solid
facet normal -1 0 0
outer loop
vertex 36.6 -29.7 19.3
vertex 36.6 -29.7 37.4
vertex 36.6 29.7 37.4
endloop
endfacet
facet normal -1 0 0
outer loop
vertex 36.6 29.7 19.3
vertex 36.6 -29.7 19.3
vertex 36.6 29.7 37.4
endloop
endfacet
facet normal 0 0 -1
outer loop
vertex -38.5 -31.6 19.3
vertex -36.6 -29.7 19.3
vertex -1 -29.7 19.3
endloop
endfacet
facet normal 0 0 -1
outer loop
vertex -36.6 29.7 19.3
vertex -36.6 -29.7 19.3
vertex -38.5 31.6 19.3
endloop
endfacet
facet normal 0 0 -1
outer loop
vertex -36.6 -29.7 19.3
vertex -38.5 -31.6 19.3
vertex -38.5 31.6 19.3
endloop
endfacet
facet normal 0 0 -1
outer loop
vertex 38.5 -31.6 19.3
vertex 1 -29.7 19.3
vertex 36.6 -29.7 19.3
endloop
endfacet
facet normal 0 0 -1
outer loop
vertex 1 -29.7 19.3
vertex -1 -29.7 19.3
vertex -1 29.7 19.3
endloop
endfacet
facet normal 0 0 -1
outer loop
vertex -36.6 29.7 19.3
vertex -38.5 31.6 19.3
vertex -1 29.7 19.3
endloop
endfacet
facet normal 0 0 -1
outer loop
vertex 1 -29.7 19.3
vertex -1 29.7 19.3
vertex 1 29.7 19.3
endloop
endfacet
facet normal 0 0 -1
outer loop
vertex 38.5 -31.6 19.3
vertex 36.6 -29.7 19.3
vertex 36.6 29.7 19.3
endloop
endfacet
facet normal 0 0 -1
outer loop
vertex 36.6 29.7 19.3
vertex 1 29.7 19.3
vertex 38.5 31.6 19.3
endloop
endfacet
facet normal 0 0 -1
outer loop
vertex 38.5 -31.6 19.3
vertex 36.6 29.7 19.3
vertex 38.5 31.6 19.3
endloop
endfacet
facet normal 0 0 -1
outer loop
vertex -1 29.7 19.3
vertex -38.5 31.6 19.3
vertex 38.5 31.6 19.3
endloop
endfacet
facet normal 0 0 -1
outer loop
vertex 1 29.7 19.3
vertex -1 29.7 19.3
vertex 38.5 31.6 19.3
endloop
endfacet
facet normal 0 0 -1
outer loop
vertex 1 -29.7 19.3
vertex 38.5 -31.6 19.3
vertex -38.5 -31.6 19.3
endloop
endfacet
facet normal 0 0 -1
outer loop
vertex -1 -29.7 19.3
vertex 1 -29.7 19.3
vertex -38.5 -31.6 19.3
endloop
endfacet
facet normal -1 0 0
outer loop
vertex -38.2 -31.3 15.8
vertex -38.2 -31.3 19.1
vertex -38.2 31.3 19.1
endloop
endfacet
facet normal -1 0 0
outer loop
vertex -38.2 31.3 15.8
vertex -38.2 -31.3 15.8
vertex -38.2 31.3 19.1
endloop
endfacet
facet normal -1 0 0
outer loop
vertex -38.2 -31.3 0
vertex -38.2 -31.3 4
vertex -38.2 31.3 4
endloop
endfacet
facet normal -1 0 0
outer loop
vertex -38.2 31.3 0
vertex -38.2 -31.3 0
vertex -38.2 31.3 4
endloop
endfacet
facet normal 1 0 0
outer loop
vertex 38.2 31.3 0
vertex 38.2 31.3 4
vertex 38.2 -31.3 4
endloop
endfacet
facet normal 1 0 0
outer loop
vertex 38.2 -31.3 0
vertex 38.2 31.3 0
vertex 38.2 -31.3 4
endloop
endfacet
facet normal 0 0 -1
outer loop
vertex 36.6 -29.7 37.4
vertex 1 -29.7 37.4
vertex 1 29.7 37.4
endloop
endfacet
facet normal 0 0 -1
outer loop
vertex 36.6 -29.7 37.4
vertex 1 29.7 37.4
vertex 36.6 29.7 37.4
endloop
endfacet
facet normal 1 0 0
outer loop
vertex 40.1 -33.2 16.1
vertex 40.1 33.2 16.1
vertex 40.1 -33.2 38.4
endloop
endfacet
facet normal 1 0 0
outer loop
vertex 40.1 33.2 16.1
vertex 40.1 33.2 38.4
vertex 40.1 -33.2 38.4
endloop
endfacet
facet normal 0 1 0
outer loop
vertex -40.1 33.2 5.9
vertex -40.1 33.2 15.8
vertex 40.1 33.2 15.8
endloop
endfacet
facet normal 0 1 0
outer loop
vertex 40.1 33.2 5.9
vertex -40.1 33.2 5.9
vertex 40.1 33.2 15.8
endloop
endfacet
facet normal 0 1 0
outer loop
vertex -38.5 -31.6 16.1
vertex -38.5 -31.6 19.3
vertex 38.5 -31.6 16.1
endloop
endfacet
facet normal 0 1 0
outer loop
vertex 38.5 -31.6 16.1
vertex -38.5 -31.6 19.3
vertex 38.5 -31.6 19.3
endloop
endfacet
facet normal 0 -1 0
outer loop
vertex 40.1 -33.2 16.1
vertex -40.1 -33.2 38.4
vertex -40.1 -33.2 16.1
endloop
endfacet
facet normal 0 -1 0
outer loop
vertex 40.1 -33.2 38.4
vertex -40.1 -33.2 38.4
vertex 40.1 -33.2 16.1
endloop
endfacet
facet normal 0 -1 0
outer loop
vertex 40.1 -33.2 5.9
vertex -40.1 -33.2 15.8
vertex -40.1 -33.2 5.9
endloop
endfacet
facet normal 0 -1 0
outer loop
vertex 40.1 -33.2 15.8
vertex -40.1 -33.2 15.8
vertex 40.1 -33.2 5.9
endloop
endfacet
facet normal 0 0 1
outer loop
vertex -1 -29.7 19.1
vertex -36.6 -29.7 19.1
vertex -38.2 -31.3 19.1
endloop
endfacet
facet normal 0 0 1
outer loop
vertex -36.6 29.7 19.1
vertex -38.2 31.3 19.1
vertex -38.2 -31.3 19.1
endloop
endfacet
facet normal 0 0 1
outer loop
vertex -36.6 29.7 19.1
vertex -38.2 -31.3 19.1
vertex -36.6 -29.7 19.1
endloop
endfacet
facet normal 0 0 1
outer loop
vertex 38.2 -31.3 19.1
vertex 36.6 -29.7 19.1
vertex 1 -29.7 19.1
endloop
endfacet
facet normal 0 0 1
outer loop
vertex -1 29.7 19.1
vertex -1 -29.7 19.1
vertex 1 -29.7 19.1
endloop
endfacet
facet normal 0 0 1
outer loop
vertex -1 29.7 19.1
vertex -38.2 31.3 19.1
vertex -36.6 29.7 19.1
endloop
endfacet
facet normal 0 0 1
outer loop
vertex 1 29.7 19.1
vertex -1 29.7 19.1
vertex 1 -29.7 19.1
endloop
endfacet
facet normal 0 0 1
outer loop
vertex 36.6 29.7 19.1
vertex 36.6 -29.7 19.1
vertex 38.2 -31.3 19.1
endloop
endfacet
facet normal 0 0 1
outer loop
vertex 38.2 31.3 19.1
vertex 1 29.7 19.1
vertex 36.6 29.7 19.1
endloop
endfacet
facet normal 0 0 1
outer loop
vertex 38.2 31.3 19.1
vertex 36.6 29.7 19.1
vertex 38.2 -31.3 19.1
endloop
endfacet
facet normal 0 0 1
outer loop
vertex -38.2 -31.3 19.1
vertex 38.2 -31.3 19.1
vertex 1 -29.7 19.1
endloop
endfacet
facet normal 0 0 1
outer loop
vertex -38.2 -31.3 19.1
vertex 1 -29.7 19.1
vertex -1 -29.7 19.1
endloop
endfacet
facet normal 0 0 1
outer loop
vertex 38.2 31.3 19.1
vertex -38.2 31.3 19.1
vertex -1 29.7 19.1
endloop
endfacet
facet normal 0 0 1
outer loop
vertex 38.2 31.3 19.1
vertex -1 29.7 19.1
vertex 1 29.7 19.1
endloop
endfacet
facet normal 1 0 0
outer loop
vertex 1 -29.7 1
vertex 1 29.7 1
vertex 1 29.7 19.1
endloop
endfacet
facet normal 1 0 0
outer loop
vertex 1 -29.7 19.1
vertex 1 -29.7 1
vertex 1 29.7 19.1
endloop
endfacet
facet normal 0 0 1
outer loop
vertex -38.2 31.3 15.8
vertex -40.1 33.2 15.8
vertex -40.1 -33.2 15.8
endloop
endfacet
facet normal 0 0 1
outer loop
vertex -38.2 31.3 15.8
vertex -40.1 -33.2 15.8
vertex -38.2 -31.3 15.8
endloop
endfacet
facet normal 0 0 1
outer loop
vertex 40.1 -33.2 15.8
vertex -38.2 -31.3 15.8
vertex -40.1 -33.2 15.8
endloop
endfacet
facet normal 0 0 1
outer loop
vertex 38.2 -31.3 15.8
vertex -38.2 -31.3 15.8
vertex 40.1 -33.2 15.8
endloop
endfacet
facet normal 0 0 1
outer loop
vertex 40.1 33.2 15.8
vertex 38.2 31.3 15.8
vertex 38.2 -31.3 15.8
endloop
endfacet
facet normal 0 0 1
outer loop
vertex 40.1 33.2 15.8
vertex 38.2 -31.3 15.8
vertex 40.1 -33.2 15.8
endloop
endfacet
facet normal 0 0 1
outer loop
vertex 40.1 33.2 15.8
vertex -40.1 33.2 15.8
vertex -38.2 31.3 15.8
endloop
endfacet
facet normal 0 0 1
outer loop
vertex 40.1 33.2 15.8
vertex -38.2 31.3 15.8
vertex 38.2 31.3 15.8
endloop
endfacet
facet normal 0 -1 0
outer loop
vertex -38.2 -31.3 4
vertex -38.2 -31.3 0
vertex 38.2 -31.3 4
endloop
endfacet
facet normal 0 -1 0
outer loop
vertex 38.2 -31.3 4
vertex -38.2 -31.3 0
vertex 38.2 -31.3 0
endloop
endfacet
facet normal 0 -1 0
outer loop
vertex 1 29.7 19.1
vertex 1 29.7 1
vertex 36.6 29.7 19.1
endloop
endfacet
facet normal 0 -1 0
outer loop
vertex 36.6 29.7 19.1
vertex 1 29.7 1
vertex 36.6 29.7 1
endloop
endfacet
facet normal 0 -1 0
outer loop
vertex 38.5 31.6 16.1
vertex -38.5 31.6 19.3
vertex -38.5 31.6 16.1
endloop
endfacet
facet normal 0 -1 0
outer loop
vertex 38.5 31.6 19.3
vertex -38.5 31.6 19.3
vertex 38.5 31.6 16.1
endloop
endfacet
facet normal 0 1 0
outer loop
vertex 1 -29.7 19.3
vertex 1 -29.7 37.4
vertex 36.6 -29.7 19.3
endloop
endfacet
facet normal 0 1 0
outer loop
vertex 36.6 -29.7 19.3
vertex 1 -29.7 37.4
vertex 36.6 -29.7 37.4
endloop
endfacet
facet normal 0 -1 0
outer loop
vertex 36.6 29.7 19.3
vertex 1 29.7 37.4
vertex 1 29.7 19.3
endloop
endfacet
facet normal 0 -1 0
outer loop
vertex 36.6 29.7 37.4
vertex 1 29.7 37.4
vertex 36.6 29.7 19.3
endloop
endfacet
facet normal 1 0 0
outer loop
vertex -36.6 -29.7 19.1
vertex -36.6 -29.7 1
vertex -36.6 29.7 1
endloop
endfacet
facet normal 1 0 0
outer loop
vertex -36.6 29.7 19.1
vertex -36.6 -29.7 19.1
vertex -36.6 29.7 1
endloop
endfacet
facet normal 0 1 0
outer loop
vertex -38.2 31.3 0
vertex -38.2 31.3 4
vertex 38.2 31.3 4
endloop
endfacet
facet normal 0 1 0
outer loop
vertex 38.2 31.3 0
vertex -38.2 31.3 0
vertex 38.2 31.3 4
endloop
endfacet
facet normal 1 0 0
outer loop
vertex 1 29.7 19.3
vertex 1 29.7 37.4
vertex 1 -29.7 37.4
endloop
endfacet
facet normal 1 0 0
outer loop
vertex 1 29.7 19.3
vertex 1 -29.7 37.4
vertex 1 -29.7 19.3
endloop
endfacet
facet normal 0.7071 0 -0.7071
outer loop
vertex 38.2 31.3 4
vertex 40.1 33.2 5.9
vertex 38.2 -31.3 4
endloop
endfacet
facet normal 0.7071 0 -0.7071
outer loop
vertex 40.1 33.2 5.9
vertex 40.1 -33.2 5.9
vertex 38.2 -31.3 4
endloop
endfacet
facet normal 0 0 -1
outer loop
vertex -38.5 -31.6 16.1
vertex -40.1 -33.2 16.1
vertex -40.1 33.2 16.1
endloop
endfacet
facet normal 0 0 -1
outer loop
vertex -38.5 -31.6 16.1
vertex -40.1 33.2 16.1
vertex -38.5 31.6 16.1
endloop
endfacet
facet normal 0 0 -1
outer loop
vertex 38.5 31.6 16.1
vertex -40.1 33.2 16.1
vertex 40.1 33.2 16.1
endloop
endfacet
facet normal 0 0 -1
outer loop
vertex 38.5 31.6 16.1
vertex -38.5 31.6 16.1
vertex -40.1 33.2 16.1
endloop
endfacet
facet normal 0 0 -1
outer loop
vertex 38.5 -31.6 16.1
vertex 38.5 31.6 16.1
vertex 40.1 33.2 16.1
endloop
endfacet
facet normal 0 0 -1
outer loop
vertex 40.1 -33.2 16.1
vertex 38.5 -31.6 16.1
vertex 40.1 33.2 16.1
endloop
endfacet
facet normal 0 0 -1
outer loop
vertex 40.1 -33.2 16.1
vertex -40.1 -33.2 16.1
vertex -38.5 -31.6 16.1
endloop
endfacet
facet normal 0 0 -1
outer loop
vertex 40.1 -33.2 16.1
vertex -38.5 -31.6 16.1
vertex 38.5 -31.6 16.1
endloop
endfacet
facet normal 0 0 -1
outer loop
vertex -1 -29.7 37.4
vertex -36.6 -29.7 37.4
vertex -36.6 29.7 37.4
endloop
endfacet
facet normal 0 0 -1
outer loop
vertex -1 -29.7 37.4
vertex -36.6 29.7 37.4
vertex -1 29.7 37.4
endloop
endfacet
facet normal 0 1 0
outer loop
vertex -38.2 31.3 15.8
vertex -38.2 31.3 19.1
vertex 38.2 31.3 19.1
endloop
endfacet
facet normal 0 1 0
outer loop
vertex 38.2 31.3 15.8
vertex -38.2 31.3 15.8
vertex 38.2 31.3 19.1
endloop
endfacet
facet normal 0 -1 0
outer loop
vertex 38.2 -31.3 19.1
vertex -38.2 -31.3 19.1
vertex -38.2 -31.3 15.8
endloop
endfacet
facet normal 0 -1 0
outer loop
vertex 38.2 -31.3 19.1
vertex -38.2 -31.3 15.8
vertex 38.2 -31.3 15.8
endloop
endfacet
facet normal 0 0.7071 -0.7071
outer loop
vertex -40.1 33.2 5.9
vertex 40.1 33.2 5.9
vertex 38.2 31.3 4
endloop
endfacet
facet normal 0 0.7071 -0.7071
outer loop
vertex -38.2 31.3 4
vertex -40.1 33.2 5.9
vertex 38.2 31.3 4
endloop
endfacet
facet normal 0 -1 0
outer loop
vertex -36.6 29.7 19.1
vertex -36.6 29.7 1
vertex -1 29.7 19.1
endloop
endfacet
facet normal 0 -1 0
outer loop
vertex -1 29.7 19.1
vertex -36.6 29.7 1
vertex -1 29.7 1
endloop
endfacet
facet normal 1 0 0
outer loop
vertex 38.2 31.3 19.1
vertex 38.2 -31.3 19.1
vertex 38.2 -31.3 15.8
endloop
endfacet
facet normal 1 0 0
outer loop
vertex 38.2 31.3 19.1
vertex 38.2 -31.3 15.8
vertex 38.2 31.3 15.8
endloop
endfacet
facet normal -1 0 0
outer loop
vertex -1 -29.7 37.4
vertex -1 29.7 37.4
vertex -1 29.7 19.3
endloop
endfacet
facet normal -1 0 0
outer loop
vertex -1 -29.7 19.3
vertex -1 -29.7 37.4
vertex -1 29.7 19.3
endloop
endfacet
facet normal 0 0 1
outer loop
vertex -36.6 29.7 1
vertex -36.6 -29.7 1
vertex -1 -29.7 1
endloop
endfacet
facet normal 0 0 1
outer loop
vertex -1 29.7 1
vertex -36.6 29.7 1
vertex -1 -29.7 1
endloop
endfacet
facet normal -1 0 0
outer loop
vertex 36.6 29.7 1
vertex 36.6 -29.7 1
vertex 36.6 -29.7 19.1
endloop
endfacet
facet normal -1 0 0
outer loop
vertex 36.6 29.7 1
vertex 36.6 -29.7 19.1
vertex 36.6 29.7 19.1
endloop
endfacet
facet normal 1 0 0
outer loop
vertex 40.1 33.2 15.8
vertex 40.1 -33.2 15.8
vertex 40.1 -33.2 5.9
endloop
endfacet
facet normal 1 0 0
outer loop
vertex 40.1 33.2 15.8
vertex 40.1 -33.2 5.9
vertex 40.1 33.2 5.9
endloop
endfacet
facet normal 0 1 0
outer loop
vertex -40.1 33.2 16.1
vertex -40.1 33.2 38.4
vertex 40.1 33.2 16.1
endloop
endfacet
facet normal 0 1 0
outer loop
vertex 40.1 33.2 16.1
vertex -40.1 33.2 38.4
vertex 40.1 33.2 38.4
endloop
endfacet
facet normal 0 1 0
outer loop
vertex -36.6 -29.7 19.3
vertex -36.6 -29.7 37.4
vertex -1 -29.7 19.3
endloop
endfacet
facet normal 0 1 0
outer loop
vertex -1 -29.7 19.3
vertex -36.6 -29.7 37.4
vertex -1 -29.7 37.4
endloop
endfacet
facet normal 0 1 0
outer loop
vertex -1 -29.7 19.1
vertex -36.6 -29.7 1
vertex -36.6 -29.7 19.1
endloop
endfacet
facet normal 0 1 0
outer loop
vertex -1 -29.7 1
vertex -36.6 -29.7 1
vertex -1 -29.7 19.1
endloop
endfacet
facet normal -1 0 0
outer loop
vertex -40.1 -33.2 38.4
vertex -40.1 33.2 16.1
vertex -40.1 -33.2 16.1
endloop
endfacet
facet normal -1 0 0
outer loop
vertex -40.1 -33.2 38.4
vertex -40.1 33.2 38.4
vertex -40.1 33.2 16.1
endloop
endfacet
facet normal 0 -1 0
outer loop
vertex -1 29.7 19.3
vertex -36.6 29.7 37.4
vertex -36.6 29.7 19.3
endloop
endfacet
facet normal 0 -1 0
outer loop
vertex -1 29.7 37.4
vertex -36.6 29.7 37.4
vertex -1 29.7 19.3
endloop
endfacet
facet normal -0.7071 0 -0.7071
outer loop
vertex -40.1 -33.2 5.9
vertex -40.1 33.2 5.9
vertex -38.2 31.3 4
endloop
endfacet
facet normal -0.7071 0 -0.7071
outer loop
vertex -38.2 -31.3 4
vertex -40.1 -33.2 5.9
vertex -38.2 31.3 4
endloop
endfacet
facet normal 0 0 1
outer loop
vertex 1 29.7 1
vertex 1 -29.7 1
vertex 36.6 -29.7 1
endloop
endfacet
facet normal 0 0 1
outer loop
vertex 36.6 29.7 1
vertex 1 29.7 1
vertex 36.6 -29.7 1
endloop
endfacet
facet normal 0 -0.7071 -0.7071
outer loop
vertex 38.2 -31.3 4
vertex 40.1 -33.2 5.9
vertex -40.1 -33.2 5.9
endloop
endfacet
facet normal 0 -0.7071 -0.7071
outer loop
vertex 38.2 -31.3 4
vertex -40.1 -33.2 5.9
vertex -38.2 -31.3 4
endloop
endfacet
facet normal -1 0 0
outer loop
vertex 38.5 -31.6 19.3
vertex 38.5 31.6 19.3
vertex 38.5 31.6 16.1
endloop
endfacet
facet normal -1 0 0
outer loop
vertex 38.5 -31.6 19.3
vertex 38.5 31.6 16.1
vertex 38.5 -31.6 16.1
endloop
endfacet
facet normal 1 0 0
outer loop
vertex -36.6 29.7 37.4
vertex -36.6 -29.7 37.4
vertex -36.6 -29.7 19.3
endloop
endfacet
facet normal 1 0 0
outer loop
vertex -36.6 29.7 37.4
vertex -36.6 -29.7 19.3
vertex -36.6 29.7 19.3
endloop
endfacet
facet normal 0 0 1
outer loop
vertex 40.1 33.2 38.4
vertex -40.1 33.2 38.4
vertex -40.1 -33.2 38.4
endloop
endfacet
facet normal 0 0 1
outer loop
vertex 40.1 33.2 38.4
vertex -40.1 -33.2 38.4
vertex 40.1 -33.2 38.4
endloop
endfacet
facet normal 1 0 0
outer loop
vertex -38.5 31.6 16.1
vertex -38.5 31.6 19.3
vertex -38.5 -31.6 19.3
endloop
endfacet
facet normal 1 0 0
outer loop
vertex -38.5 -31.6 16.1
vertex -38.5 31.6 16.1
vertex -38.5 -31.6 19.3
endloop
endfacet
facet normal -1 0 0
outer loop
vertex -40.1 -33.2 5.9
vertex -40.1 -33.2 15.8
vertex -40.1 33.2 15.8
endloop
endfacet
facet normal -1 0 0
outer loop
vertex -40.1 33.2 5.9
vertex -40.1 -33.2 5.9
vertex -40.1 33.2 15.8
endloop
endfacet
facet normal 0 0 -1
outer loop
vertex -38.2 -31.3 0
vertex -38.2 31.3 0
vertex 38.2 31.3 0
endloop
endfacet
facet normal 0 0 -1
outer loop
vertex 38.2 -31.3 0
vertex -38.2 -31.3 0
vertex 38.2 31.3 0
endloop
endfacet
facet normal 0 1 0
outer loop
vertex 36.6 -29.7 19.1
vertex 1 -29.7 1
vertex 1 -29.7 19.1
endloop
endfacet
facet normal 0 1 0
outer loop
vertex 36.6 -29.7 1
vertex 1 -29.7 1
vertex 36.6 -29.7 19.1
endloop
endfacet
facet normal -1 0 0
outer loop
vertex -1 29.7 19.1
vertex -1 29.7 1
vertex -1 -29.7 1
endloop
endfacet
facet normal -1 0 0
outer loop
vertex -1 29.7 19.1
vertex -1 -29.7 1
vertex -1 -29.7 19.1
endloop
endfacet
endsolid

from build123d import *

# Parameters (mm, degrees)
F4_W          = 80.2
F4_H          = 66.4
F5_DEPTH      = 1
F6_W          = 80.2
F6_H          = 66.4
F6_W_2        = 73.2
F6_H_2        = 59.4
F7_DEPTH      = 18.1
F8_W          = 2
F8_H          = 18.1
F9_DEPTH      = 59.4
F12_W         = 80.2
F12_H         = 66.4
F12_W_2       = 76.4
F12_H_2       = 62.6
F13_DEPTH     = 3.3
F14_W         = 80.2
F14_H         = 66.4
F14_W_2       = 76.4
F14_H_2       = 62.6
F15_DEPTH     = 6
F16_T4_DEPTH  = 76.4
F16_T9_DEPTH  = 62.6
F16_T14_DEPTH = 76.4
F16_T19_DEPTH = 62.6
F16_T25_DEPTH = 81.5433659759
F16_T31_DEPTH = 67.7433659759
F16_T40_DEPTH = 81.5433659759
F16_T46_DEPTH = 67.7433659759
F16_T55_DEPTH = 81.5433659759
F16_T61_DEPTH = 67.7433659759
F16_T70_DEPTH = 67.7433659759
F16_T76_DEPTH = 81.5433659759
F17_W         = 80.2
F17_H         = 66.4
F17_W_2       = 77
F17_H_2       = 63.2
F18_DEPTH     = 3.2


# Not quite as in the source:
# - a fillet or chamfer that OpenCascade refuses, or shapes differently, is made with other operations: its cross-section is extruded or revolved along the edge and cut away or added
# - a feature names something its author has since deleted; it is built from what else it names


with BuildPart() as f5:
    # F4 (on Top) → F5 (new body)
    with BuildSketch(Plane.XY):
        Rectangle(F4_W, F4_H)
    extrude(amount=F5_DEPTH)

    # F6 (on face) → F7 (join)
    with BuildSketch(Plane.XY.offset(1)):
        Rectangle(F6_W, F6_H)
        Rectangle(F6_W_2, F6_H_2, mode=Mode.SUBTRACT)
    extrude(amount=F7_DEPTH)

    # F8 (on face) → F9 (join, through all)
    with BuildSketch(Plane.XZ.offset(-29.7)):
        with Locations((0, 10.05)):
            Rectangle(F8_W, F8_H)
    extrude(amount=F9_DEPTH)


with BuildPart() as f11_1:
    # F11: instance of F5
    add(f5.part.mirror(Plane.XY.offset(19.2)))

    # F17 (on face) → F18 (join)
    with BuildSketch(Plane(origin=(0, 0, 19.3), x_dir=(1, 0, 0), z_dir=(0, 0, -1))):
        Rectangle(F17_W, F17_H)
        Rectangle(F17_W_2, F17_H_2, mode=Mode.SUBTRACT)
    extrude(amount=F18_DEPTH)


with BuildPart() as f5_1:
    add(f5.part)

    # F12 (on face) → F13 (cut)
    with BuildSketch(Plane.XY.offset(19.1)):
        Rectangle(F12_W, F12_H)
        Rectangle(F12_W_2, F12_H_2, mode=Mode.SUBTRACT)
    extrude(amount=-F13_DEPTH, mode=Mode.SUBTRACT)

    # F14 (on face) → F15 (cut)
    with BuildSketch(Plane(origin=(0, 0, 0), x_dir=(1, 0, 0), z_dir=(0, 0, -1))):
        Rectangle(F14_W, F14_H)
        Rectangle(F14_W_2, F14_H_2, mode=Mode.SUBTRACT)
    extrude(amount=-F15_DEPTH, mode=Mode.SUBTRACT)

    # F16: chamfer of 2 on 4 edges, made by hand


with BuildPart() as f16_tool2:
    # F16_s3 → F16_t4 (new body)
    with BuildSketch(Plane.YZ.offset(-38.2)):
        Polygon((-33.3, 6), (-31.3, 4), (-31.3, 6), align=None)
    extrude(amount=F16_T4_DEPTH)

    split(bisect_by=Plane.XZ.offset(33.2), keep=Keep.BOTTOM)


with BuildPart() as f5_2:
    add(f5_1.part)

    # F16_t1: union F16_tool2
    add(f16_tool2.part)


with BuildPart() as f16_tool7:
    # F16_s8 → F16_t9 (new body)
    with BuildSketch(Plane.XZ.offset(-31.3)):
        Polygon((-40.2, 6), (-38.2, 4), (-38.2, 6), align=None)
    extrude(amount=F16_T9_DEPTH)

    split(bisect_by=Plane.YZ.offset(-40.1), keep=Keep.TOP)


with BuildPart() as f5_3:
    add(f5_2.part)

    # F16_t6: union F16_tool7
    add(f16_tool7.part)


with BuildPart() as f16_tool12:
    # F16_s13 → F16_t14 (new body)
    with BuildSketch(Plane.YZ.offset(38.2)):
        Polygon((33.3, 6), (31.3, 4), (31.3, 6), align=None)
    extrude(amount=-F16_T14_DEPTH)

    split(bisect_by=Plane.XZ.offset(-33.2), keep=Keep.TOP)


with BuildPart() as f5_4:
    add(f5_3.part)

    # F16_t11: union F16_tool12
    add(f16_tool12.part)


with BuildPart() as f16_tool17:
    # F16_s18 → F16_t19 (new body)
    with BuildSketch(Plane.XZ.offset(31.3)):
        Polygon((40.2, 6), (38.2, 4), (38.2, 6), align=None)
    extrude(amount=-F16_T19_DEPTH)

    split(bisect_by=Plane.YZ.offset(40.1), keep=Keep.BOTTOM)


with BuildPart() as f5_5:
    add(f5_4.part)

    # F16_t16: union F16_tool17
    add(f16_tool17.part)


with BuildPart() as f16_tool23:
    # F16_s24 → F16_t25 (new body)
    with BuildSketch(Plane.YZ.offset(-43.3433659759)):
        Polygon((-33.3, 6), (-31.3, 4), (-31.3, 6), align=None)
    extrude(amount=F16_T25_DEPTH)

    split(bisect_by=Plane.XZ.offset(33.2), keep=Keep.BOTTOM)

    split(bisect_by=Plane.YZ.offset(-40.1), keep=Keep.TOP)

    split(bisect_by=Plane.YZ.offset(-38.2), keep=Keep.BOTTOM)


with BuildPart() as f16_tool29:
    # F16_s30 → F16_t31 (new body)
    with BuildSketch(Plane.XZ.offset(-31.3)):
        Polygon((-40.2, 6), (-38.2, 4), (-38.2, 6), align=None)
    extrude(amount=F16_T31_DEPTH)

    split(bisect_by=Plane.XZ.offset(33.2), keep=Keep.BOTTOM)

    split(bisect_by=Plane.YZ.offset(-40.1), keep=Keep.TOP)

    split(bisect_by=Plane.XZ.offset(31.3), keep=Keep.TOP)


with BuildPart() as f16_tool23_1:
    add(f16_tool23.part)

    # F16_t35: intersect F16_tool29
    add(f16_tool29.part, mode=Mode.INTERSECT)


with BuildPart() as f5_6:
    add(f5_5.part)

    # F16_t21: union F16_tool23
    add(f16_tool23_1.part)


with BuildPart() as f16_tool38:
    # F16_s39 → F16_t40 (new body)
    with BuildSketch(Plane.YZ.offset(-38.2)):
        Polygon((-33.3, 6), (-31.3, 4), (-31.3, 6), align=None)
    extrude(amount=F16_T40_DEPTH)

    split(bisect_by=Plane.XZ.offset(33.2), keep=Keep.BOTTOM)

    split(bisect_by=Plane.YZ.offset(40.1), keep=Keep.BOTTOM)

    split(bisect_by=Plane.YZ.offset(38.2), keep=Keep.TOP)


with BuildPart() as f16_tool44:
    # F16_s45 → F16_t46 (new body)
    with BuildSketch(Plane.XZ.offset(36.4433659759)):
        Polygon((40.2, 6), (38.2, 4), (38.2, 6), align=None)
    extrude(amount=-F16_T46_DEPTH)

    split(bisect_by=Plane.XZ.offset(33.2), keep=Keep.BOTTOM)

    split(bisect_by=Plane.YZ.offset(40.1), keep=Keep.BOTTOM)

    split(bisect_by=Plane.XZ.offset(31.3), keep=Keep.TOP)


with BuildPart() as f16_tool38_1:
    add(f16_tool38.part)

    # F16_t50: intersect F16_tool44
    add(f16_tool44.part, mode=Mode.INTERSECT)


with BuildPart() as f5_7:
    add(f5_6.part)

    # F16_t36: union F16_tool38
    add(f16_tool38_1.part)


with BuildPart() as f16_tool53:
    # F16_s54 → F16_t55 (new body)
    with BuildSketch(Plane.YZ.offset(38.2)):
        Polygon((33.3, 6), (31.3, 4), (31.3, 6), align=None)
    extrude(amount=-F16_T55_DEPTH)

    split(bisect_by=Plane.YZ.offset(-40.1), keep=Keep.TOP)

    split(bisect_by=Plane.XZ.offset(-33.2), keep=Keep.TOP)

    split(bisect_by=Plane.YZ.offset(-38.2), keep=Keep.BOTTOM)


with BuildPart() as f16_tool59:
    # F16_s60 → F16_t61 (new body)
    with BuildSketch(Plane.XZ.offset(-36.4433659759)):
        Polygon((-40.2, 6), (-38.2, 4), (-38.2, 6), align=None)
    extrude(amount=F16_T61_DEPTH)

    split(bisect_by=Plane.YZ.offset(-40.1), keep=Keep.TOP)

    split(bisect_by=Plane.XZ.offset(-33.2), keep=Keep.TOP)

    split(bisect_by=Plane.XZ.offset(-31.3), keep=Keep.BOTTOM)


with BuildPart() as f16_tool53_1:
    add(f16_tool53.part)

    # F16_t65: intersect F16_tool59
    add(f16_tool59.part, mode=Mode.INTERSECT)


with BuildPart() as f5_8:
    add(f5_7.part)

    # F16_t51: union F16_tool53
    add(f16_tool53_1.part)


with BuildPart() as f16_tool68:
    # F16_s69 → F16_t70 (new body)
    with BuildSketch(Plane.XZ.offset(31.3)):
        Polygon((40.2, 6), (38.2, 4), (38.2, 6), align=None)
    extrude(amount=-F16_T70_DEPTH)

    split(bisect_by=Plane.YZ.offset(40.1), keep=Keep.BOTTOM)

    split(bisect_by=Plane.XZ.offset(-33.2), keep=Keep.TOP)

    split(bisect_by=Plane.XZ.offset(-31.3), keep=Keep.BOTTOM)


with BuildPart() as f16_tool74:
    # F16_s75 → F16_t76 (new body)
    with BuildSketch(Plane.YZ.offset(43.3433659759)):
        Polygon((33.3, 6), (31.3, 4), (31.3, 6), align=None)
    extrude(amount=-F16_T76_DEPTH)

    split(bisect_by=Plane.YZ.offset(40.1), keep=Keep.BOTTOM)

    split(bisect_by=Plane.XZ.offset(-33.2), keep=Keep.TOP)

    split(bisect_by=Plane.YZ.offset(38.2), keep=Keep.TOP)


with BuildPart() as f16_tool68_1:
    add(f16_tool68.part)

    # F16_t80: intersect F16_tool74
    add(f16_tool74.part, mode=Mode.INTERSECT)


with BuildPart() as f5_9:
    add(f5_8.part)

    # F16_t66: union F16_tool68
    add(f16_tool68_1.part)


solid = Compound([f11_1.part, f5_9.part])
